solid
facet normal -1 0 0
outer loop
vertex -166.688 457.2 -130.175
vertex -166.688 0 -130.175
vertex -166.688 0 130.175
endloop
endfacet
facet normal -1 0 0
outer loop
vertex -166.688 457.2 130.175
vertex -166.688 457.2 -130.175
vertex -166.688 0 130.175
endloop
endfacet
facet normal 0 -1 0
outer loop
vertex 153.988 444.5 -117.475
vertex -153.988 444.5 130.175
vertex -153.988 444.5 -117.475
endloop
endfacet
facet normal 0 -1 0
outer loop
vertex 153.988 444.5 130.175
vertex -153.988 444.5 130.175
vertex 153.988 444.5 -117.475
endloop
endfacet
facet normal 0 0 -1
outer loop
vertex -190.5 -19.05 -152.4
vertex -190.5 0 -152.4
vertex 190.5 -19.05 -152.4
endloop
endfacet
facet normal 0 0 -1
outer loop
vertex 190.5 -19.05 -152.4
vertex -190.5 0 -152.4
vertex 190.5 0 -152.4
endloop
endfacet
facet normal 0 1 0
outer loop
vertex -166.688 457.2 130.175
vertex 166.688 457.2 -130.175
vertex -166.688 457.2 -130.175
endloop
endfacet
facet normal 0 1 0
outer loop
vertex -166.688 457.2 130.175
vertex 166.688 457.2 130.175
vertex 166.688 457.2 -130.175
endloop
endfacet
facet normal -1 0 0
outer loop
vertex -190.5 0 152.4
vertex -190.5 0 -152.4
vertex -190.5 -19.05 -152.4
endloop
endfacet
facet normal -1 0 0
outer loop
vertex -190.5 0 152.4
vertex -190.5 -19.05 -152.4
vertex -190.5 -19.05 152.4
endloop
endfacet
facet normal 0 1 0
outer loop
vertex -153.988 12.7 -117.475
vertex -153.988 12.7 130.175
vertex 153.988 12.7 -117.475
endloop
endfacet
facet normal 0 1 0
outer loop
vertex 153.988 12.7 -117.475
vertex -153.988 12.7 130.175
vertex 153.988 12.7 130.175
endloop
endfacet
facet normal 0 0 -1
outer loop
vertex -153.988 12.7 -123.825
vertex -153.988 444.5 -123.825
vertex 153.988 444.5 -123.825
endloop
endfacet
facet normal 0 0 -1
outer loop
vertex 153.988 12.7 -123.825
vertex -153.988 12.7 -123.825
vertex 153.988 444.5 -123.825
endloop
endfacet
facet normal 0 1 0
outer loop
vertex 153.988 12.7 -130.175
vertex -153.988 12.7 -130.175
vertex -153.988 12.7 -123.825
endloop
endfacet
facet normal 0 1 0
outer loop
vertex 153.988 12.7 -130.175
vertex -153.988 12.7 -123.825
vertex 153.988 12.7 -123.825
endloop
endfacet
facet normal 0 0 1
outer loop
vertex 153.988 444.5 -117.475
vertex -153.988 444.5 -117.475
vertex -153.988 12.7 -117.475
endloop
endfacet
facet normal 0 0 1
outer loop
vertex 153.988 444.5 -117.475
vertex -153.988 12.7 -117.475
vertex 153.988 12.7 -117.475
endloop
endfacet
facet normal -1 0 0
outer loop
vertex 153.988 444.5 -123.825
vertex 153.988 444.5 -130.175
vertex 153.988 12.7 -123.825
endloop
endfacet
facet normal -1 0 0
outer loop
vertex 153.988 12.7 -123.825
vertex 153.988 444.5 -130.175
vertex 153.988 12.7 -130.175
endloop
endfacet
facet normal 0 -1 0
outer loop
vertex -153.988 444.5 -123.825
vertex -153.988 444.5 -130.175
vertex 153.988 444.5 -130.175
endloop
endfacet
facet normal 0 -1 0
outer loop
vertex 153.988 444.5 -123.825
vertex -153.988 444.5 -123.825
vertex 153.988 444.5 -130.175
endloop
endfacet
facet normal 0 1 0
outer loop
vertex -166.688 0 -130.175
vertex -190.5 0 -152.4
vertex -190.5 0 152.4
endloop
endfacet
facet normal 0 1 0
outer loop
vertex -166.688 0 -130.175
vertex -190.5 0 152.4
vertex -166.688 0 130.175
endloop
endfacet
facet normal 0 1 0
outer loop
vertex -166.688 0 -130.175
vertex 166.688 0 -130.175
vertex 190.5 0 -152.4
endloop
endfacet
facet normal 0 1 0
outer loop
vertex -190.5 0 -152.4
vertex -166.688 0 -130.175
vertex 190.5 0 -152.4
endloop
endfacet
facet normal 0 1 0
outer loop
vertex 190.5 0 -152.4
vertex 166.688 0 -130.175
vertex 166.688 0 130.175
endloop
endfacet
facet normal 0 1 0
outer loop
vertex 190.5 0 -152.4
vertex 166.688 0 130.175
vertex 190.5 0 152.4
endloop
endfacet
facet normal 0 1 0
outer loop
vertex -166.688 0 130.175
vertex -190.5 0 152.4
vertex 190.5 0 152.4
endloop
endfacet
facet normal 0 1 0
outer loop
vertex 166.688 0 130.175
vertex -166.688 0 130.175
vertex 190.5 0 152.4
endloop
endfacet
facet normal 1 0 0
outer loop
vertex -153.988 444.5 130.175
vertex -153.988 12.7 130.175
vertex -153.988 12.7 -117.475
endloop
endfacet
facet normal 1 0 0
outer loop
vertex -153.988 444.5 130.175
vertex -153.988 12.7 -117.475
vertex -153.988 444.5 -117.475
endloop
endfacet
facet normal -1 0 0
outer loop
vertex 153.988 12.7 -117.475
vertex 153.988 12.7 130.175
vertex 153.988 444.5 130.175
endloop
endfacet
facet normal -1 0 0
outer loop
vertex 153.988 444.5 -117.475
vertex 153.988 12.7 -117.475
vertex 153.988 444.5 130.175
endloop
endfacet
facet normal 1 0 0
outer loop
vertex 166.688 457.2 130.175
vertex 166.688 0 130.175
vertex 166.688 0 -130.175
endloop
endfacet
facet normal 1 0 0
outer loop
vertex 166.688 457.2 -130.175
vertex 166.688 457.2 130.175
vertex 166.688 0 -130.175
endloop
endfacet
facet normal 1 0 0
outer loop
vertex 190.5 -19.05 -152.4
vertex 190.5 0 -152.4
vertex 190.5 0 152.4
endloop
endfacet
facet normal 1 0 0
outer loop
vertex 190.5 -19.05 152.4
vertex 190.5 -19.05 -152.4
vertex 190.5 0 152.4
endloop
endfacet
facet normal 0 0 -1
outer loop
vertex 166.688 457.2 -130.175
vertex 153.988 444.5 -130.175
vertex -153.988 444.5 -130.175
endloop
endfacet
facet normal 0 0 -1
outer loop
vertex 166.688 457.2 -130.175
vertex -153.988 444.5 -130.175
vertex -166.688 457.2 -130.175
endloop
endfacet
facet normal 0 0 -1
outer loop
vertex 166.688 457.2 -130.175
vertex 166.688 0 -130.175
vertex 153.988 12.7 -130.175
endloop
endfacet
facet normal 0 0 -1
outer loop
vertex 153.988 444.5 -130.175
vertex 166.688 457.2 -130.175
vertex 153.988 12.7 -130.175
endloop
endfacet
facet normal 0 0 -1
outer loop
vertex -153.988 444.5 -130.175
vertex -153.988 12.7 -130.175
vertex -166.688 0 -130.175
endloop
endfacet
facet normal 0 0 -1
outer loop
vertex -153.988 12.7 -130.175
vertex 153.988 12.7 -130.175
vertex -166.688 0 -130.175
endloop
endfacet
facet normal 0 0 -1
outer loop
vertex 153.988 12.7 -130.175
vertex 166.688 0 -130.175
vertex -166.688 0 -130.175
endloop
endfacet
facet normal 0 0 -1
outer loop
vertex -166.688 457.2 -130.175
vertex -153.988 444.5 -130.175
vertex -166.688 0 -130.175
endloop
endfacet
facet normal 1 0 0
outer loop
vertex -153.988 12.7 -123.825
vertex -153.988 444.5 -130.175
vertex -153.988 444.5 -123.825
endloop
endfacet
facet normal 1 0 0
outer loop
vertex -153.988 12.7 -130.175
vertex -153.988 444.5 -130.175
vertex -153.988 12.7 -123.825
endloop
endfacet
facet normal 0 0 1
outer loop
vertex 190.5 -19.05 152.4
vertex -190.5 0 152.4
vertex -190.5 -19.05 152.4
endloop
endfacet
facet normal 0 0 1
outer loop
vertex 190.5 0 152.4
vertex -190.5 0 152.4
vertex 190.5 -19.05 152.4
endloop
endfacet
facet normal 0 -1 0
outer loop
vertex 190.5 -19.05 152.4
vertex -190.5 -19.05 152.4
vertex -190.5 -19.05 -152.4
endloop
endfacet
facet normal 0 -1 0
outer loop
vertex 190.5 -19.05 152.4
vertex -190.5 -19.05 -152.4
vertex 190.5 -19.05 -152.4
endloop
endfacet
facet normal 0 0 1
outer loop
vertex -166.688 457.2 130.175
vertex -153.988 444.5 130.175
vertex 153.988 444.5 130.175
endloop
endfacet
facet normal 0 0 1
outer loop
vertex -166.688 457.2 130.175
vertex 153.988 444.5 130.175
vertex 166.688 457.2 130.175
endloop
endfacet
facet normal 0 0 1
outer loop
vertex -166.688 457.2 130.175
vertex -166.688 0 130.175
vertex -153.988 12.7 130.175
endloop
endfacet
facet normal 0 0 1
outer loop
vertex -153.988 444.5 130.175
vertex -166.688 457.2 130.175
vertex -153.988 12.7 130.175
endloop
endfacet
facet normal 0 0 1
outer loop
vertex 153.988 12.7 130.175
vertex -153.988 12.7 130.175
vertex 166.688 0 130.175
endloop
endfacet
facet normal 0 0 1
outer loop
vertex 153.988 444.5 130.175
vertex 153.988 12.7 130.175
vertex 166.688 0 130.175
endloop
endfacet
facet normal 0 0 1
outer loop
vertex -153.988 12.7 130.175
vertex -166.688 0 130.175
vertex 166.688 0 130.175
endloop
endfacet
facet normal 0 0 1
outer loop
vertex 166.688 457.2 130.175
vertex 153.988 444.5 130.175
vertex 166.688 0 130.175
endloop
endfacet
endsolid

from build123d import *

# Parameters (mm, degrees)
F0_W     = 381
F0_H     = 304.8
F1_DEPTH = 19.05
F3_DEPTH = 457.2
F4_W     = 307.975
F4_H     = 431.8
F5_DEPTH = 6.35
F6_W     = 307.975
F6_H     = 431.8
F7_DEPTH = 247.65


with BuildPart() as f1:
    # F0 (on Front) → F1 (new body)
    with BuildSketch(Plane.XZ):
        Rectangle(F0_W, F0_H)
    extrude(amount=F1_DEPTH)

    # F2 (on face) → F3 (join)
    with BuildSketch(Plane(origin=(0, 0, 0), x_dir=(-1, 0, 0), z_dir=(0, 1, 0))):
        Polygon((-166.6875, -130.175), (0, -130.175), (166.6875, -130.175), (166.6875, 130.175), (-166.6875, 130.175), align=None)
    extrude(amount=F3_DEPTH)

    # F4 (on face) → F5 (cut)
    with BuildSketch(Plane(origin=(0, 0, -130.175), x_dir=(1, 0, 0), z_dir=(0, 0, -1))):
        with Locations((0, -228.6)):
            Rectangle(F4_W, F4_H)
    extrude(amount=-F5_DEPTH, mode=Mode.SUBTRACT)

    # F6 (on face) → F7 (cut)
    with BuildSketch(Plane.XY.offset(130.175)):
        with Locations((0, 228.6)):
            Rectangle(F6_W, F6_H)
    extrude(amount=-F7_DEPTH, mode=Mode.SUBTRACT)


solid = f1.part
